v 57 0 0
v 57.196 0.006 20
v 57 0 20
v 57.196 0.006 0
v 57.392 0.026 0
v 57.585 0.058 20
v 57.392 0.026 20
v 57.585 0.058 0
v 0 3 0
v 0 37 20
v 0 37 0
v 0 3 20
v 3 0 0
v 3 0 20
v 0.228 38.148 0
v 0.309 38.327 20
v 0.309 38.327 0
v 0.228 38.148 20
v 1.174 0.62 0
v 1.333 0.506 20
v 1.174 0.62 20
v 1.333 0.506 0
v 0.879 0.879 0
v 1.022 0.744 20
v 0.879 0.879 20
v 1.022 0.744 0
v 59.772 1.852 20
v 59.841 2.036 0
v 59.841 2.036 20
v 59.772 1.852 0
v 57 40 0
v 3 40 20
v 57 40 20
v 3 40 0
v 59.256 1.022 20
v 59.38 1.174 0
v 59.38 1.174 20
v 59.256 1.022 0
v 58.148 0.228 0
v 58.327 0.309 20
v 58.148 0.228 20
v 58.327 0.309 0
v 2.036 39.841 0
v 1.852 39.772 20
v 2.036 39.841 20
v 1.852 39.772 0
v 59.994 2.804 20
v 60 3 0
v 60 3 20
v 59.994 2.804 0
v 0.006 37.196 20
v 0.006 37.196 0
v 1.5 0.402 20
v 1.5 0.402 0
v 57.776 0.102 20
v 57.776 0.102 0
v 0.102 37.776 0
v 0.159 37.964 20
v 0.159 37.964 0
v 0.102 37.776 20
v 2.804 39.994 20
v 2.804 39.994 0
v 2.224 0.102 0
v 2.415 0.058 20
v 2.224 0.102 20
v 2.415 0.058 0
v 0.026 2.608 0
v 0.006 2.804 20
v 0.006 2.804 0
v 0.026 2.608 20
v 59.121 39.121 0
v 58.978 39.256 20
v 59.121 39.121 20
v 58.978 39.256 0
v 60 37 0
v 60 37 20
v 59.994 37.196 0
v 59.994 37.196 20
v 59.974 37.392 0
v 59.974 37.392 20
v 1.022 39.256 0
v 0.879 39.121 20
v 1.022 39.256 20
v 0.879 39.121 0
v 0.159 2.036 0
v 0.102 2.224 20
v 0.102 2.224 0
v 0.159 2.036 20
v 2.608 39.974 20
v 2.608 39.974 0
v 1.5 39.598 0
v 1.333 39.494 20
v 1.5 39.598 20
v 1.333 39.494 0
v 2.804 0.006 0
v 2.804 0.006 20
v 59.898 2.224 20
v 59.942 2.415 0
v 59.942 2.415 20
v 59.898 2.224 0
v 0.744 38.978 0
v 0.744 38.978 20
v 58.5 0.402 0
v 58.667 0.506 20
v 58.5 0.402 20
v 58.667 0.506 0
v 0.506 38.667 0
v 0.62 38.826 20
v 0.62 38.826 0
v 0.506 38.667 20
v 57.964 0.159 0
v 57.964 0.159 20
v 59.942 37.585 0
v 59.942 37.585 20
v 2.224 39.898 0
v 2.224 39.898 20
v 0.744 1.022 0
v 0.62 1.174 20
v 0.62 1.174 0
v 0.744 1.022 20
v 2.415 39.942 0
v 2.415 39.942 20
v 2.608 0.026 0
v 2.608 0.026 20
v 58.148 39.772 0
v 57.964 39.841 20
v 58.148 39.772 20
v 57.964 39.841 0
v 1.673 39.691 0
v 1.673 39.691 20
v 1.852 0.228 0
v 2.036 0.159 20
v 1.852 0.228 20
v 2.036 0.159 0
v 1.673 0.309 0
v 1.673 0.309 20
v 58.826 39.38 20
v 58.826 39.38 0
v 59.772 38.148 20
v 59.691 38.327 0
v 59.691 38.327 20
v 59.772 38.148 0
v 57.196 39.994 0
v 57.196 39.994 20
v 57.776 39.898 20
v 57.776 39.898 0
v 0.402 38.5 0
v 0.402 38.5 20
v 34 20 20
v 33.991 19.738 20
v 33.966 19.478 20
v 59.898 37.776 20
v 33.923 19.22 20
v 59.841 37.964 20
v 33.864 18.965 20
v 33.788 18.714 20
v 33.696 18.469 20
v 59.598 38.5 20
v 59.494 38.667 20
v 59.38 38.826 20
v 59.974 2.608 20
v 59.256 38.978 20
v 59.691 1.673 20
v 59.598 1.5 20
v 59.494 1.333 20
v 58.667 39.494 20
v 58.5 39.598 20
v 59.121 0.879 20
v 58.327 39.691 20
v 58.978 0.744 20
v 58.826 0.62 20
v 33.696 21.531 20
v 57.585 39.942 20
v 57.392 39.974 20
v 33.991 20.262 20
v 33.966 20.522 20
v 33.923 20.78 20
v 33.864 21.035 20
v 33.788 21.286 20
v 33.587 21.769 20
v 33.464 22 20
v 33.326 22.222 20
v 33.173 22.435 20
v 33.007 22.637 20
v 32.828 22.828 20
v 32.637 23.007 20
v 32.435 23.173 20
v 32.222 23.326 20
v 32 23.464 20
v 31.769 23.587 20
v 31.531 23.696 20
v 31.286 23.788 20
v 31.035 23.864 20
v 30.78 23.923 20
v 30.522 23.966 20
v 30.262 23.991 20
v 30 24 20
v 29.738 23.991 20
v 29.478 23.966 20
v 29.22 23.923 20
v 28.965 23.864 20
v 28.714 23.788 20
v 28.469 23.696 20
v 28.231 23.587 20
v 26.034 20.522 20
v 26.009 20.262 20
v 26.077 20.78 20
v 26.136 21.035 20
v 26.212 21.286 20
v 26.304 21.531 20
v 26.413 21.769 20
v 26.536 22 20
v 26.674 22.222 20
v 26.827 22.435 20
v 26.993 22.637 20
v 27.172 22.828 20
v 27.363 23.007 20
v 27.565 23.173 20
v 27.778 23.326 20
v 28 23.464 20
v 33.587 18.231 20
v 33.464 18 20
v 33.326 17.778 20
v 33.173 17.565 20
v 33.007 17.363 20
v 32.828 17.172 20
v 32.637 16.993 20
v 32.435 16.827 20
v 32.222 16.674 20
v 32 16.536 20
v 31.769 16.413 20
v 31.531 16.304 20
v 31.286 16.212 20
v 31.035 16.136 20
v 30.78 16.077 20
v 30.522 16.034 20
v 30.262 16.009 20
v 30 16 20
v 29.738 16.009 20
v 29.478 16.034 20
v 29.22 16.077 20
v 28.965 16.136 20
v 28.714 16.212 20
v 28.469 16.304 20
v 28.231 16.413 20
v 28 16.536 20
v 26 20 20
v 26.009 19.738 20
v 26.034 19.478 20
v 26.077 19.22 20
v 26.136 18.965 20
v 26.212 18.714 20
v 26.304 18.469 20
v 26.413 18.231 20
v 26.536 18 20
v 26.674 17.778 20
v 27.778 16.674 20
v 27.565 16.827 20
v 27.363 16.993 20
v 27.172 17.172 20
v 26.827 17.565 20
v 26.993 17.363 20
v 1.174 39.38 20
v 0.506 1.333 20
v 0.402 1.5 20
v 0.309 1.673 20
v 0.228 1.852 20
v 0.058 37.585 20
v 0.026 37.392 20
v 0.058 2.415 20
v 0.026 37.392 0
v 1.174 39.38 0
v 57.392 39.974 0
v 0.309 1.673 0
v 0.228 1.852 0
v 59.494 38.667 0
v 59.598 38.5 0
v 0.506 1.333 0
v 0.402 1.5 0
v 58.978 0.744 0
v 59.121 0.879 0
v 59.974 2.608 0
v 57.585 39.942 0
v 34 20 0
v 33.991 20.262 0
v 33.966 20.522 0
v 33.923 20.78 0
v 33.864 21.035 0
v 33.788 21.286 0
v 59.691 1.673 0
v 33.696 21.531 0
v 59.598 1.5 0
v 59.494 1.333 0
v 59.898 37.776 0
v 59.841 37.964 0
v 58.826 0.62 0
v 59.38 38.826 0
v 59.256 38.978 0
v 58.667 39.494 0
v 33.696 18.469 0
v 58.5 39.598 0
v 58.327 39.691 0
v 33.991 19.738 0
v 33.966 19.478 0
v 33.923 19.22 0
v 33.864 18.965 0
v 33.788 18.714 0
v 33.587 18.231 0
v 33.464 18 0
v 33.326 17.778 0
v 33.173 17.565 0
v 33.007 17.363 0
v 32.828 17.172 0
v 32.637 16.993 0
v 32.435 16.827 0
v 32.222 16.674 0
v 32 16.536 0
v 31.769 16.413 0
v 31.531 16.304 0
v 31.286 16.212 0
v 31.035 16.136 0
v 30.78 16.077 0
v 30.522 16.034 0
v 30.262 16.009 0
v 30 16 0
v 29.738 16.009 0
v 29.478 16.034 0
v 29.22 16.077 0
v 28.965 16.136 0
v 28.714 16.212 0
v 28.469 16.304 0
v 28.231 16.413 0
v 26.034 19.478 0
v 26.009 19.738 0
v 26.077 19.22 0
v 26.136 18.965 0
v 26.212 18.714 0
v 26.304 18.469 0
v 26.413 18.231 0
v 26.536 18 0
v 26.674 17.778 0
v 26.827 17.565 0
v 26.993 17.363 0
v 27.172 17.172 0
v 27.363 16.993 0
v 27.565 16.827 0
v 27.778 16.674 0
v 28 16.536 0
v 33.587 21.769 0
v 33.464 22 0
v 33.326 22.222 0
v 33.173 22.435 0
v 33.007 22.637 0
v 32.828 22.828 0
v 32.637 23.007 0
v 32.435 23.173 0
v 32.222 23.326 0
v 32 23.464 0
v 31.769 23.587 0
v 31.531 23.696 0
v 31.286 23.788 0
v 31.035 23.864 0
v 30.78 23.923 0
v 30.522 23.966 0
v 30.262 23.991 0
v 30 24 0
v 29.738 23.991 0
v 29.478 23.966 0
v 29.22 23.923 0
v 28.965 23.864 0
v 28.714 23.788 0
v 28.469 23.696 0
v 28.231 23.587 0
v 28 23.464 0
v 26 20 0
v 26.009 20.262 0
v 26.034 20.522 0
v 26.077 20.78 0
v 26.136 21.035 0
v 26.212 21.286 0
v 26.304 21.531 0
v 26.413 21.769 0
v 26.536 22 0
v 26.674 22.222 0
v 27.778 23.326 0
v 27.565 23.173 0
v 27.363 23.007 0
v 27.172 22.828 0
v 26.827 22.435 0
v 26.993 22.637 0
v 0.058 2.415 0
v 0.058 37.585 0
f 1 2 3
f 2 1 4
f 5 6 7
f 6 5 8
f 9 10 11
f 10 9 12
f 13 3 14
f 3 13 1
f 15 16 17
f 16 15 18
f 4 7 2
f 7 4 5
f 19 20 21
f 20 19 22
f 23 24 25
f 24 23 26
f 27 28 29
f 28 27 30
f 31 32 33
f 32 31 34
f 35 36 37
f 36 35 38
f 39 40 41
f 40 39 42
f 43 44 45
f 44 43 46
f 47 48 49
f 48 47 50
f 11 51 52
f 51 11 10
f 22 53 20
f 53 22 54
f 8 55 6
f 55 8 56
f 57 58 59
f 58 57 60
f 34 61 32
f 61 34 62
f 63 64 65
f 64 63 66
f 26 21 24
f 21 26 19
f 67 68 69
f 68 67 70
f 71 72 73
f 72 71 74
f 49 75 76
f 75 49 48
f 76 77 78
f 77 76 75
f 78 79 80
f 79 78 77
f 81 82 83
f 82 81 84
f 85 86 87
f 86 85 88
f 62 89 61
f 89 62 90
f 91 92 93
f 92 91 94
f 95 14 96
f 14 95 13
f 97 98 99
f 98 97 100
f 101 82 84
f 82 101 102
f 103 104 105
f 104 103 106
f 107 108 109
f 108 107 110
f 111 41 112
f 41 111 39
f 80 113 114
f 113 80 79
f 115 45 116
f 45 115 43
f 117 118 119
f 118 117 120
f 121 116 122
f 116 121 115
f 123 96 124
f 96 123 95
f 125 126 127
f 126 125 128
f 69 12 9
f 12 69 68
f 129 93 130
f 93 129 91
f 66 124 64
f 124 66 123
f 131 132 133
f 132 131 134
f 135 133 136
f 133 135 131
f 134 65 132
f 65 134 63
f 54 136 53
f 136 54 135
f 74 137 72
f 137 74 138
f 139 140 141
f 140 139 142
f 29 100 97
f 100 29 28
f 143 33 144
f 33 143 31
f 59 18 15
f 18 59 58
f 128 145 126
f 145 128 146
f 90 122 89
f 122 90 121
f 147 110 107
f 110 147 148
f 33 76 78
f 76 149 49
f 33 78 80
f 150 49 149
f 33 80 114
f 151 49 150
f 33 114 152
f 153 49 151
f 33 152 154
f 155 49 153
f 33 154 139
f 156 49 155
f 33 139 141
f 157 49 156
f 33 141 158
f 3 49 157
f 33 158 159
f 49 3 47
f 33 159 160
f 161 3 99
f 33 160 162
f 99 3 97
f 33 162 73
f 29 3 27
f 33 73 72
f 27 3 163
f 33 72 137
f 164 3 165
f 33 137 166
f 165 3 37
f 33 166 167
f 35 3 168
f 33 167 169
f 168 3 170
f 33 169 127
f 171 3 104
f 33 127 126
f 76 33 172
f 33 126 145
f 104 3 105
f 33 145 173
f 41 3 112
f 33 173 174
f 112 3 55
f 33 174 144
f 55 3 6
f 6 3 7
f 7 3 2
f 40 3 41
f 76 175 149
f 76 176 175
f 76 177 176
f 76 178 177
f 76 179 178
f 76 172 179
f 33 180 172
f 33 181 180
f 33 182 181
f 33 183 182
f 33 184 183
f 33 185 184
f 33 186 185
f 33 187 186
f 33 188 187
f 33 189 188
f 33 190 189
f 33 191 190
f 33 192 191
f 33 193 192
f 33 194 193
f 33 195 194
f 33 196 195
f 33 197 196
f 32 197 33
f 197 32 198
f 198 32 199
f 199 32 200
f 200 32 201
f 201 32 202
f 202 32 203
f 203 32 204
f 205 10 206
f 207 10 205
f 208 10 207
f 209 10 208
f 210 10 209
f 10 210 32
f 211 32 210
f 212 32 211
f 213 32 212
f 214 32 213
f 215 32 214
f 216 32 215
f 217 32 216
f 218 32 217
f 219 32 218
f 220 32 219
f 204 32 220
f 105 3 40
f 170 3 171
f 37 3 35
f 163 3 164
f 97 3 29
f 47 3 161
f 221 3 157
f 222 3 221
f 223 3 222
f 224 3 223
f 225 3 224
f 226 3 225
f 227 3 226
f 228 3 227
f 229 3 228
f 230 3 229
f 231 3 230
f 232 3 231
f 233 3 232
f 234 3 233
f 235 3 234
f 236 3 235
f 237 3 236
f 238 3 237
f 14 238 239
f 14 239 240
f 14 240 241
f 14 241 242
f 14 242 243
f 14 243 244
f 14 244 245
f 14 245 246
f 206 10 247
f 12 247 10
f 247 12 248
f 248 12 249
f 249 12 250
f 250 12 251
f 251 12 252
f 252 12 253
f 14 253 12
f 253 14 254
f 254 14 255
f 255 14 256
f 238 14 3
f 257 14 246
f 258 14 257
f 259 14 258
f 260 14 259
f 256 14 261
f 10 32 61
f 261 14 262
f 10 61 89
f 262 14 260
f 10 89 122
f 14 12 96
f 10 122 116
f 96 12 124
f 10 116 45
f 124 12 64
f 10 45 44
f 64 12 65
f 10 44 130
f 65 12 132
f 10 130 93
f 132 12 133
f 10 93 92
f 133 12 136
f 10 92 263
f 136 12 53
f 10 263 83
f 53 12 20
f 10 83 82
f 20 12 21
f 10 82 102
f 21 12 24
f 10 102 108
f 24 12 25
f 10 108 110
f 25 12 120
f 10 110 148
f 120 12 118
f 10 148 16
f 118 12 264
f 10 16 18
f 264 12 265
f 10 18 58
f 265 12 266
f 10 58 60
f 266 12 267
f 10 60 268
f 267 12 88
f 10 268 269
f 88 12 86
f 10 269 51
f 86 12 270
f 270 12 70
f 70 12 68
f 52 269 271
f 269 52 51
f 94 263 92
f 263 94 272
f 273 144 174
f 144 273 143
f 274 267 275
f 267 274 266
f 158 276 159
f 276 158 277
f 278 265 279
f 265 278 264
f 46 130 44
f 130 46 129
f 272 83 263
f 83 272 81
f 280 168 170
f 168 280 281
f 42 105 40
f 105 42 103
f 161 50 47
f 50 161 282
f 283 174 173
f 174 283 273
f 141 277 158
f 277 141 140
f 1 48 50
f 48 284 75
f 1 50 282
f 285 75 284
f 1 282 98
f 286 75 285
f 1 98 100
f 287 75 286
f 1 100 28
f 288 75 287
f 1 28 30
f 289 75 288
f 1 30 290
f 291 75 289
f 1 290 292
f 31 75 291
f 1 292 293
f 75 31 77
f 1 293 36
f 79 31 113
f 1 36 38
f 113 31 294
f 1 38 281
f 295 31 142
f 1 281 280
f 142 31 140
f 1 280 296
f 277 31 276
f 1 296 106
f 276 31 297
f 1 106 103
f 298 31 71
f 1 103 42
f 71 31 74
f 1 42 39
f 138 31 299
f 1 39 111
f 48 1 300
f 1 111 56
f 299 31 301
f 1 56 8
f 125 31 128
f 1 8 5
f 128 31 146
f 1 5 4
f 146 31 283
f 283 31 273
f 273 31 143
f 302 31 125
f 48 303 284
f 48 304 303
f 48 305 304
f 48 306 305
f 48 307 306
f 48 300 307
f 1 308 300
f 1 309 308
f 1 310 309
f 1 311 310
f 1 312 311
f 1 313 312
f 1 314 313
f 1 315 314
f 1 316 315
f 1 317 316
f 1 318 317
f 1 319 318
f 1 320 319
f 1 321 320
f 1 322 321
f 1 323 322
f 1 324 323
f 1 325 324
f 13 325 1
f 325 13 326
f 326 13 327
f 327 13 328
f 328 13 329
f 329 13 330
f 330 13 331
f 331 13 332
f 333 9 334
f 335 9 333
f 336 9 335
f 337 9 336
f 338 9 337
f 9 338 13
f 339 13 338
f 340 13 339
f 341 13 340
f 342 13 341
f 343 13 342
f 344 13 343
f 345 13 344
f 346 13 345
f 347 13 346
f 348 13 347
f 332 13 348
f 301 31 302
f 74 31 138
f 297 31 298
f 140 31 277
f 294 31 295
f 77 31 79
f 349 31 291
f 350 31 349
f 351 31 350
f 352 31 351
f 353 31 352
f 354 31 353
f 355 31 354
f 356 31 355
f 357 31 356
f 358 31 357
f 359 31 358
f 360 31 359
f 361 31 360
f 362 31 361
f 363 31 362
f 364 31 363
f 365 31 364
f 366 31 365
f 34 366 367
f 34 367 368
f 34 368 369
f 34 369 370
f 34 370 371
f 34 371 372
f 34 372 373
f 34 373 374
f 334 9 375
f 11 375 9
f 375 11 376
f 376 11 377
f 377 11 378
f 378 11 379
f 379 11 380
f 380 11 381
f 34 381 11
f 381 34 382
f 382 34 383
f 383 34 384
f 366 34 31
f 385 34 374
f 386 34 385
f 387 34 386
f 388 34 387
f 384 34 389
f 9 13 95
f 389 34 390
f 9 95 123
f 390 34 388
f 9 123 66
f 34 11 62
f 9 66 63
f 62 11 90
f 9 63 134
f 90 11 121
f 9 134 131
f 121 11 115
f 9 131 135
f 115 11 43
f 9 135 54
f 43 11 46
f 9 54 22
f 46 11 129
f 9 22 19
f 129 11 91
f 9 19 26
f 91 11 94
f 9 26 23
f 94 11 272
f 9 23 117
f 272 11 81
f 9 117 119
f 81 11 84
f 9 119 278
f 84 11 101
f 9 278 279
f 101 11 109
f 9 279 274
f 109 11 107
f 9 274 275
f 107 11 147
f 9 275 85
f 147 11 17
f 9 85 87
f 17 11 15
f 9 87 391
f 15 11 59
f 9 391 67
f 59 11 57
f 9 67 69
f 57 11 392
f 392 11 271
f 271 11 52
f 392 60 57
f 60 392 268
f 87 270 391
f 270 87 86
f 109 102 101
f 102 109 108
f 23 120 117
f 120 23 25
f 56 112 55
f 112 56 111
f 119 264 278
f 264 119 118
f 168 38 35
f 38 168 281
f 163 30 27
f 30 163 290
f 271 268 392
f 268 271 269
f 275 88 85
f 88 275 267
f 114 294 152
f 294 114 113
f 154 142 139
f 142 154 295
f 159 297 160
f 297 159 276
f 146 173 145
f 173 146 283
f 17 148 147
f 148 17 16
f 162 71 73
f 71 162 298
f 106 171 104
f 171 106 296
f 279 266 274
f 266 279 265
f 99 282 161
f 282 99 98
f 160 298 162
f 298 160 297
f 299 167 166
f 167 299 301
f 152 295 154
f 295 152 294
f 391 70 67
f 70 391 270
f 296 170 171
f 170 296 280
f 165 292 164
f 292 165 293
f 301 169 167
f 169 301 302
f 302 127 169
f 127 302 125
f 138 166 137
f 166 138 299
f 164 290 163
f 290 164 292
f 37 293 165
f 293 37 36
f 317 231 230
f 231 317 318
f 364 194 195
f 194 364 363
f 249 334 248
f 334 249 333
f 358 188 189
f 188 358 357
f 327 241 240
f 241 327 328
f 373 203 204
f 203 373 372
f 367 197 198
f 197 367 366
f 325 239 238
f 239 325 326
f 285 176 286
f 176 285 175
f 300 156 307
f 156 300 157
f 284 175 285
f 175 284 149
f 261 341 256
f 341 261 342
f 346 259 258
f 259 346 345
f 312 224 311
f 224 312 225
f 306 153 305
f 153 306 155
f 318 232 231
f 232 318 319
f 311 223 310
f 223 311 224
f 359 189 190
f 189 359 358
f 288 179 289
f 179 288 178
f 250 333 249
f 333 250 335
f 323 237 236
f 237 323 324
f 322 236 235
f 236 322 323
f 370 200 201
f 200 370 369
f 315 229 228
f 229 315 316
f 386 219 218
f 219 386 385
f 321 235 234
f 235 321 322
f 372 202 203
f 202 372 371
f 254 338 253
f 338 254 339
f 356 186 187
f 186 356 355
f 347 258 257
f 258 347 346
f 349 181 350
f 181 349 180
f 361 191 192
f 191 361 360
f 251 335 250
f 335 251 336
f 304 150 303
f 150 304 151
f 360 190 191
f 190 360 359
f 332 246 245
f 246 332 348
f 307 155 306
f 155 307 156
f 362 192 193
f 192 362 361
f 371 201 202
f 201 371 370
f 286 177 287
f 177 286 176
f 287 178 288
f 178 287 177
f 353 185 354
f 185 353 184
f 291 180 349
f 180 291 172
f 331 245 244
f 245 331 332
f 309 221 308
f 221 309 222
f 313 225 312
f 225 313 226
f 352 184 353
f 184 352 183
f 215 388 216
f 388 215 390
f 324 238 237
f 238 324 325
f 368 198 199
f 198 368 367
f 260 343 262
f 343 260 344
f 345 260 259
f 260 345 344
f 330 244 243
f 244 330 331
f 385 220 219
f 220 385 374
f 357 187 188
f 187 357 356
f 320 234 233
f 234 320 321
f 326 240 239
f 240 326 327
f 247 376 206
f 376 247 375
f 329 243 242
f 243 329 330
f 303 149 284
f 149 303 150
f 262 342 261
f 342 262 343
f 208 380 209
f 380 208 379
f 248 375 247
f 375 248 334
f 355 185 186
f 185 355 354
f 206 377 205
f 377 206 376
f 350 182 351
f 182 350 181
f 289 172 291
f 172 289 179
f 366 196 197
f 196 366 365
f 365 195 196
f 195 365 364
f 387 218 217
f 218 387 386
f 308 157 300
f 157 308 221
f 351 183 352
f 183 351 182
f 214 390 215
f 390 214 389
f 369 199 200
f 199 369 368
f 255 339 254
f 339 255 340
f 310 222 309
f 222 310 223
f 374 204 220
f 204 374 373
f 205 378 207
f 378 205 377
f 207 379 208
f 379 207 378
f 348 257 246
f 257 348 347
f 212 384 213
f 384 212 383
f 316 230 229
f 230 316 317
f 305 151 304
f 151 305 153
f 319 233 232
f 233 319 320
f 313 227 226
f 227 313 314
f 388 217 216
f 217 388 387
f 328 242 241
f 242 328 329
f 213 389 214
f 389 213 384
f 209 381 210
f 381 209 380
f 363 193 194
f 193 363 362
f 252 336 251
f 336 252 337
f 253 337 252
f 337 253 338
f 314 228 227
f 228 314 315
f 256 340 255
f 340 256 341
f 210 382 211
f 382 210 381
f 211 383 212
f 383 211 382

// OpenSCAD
$fn=96;
radius=3;
difference(){linear_extrude(20) offset(r=radius) translate([radius,radius]) square([60-2*radius,40-2*radius]); translate([30,20,-1]) cylinder(h=22,r=4);}
